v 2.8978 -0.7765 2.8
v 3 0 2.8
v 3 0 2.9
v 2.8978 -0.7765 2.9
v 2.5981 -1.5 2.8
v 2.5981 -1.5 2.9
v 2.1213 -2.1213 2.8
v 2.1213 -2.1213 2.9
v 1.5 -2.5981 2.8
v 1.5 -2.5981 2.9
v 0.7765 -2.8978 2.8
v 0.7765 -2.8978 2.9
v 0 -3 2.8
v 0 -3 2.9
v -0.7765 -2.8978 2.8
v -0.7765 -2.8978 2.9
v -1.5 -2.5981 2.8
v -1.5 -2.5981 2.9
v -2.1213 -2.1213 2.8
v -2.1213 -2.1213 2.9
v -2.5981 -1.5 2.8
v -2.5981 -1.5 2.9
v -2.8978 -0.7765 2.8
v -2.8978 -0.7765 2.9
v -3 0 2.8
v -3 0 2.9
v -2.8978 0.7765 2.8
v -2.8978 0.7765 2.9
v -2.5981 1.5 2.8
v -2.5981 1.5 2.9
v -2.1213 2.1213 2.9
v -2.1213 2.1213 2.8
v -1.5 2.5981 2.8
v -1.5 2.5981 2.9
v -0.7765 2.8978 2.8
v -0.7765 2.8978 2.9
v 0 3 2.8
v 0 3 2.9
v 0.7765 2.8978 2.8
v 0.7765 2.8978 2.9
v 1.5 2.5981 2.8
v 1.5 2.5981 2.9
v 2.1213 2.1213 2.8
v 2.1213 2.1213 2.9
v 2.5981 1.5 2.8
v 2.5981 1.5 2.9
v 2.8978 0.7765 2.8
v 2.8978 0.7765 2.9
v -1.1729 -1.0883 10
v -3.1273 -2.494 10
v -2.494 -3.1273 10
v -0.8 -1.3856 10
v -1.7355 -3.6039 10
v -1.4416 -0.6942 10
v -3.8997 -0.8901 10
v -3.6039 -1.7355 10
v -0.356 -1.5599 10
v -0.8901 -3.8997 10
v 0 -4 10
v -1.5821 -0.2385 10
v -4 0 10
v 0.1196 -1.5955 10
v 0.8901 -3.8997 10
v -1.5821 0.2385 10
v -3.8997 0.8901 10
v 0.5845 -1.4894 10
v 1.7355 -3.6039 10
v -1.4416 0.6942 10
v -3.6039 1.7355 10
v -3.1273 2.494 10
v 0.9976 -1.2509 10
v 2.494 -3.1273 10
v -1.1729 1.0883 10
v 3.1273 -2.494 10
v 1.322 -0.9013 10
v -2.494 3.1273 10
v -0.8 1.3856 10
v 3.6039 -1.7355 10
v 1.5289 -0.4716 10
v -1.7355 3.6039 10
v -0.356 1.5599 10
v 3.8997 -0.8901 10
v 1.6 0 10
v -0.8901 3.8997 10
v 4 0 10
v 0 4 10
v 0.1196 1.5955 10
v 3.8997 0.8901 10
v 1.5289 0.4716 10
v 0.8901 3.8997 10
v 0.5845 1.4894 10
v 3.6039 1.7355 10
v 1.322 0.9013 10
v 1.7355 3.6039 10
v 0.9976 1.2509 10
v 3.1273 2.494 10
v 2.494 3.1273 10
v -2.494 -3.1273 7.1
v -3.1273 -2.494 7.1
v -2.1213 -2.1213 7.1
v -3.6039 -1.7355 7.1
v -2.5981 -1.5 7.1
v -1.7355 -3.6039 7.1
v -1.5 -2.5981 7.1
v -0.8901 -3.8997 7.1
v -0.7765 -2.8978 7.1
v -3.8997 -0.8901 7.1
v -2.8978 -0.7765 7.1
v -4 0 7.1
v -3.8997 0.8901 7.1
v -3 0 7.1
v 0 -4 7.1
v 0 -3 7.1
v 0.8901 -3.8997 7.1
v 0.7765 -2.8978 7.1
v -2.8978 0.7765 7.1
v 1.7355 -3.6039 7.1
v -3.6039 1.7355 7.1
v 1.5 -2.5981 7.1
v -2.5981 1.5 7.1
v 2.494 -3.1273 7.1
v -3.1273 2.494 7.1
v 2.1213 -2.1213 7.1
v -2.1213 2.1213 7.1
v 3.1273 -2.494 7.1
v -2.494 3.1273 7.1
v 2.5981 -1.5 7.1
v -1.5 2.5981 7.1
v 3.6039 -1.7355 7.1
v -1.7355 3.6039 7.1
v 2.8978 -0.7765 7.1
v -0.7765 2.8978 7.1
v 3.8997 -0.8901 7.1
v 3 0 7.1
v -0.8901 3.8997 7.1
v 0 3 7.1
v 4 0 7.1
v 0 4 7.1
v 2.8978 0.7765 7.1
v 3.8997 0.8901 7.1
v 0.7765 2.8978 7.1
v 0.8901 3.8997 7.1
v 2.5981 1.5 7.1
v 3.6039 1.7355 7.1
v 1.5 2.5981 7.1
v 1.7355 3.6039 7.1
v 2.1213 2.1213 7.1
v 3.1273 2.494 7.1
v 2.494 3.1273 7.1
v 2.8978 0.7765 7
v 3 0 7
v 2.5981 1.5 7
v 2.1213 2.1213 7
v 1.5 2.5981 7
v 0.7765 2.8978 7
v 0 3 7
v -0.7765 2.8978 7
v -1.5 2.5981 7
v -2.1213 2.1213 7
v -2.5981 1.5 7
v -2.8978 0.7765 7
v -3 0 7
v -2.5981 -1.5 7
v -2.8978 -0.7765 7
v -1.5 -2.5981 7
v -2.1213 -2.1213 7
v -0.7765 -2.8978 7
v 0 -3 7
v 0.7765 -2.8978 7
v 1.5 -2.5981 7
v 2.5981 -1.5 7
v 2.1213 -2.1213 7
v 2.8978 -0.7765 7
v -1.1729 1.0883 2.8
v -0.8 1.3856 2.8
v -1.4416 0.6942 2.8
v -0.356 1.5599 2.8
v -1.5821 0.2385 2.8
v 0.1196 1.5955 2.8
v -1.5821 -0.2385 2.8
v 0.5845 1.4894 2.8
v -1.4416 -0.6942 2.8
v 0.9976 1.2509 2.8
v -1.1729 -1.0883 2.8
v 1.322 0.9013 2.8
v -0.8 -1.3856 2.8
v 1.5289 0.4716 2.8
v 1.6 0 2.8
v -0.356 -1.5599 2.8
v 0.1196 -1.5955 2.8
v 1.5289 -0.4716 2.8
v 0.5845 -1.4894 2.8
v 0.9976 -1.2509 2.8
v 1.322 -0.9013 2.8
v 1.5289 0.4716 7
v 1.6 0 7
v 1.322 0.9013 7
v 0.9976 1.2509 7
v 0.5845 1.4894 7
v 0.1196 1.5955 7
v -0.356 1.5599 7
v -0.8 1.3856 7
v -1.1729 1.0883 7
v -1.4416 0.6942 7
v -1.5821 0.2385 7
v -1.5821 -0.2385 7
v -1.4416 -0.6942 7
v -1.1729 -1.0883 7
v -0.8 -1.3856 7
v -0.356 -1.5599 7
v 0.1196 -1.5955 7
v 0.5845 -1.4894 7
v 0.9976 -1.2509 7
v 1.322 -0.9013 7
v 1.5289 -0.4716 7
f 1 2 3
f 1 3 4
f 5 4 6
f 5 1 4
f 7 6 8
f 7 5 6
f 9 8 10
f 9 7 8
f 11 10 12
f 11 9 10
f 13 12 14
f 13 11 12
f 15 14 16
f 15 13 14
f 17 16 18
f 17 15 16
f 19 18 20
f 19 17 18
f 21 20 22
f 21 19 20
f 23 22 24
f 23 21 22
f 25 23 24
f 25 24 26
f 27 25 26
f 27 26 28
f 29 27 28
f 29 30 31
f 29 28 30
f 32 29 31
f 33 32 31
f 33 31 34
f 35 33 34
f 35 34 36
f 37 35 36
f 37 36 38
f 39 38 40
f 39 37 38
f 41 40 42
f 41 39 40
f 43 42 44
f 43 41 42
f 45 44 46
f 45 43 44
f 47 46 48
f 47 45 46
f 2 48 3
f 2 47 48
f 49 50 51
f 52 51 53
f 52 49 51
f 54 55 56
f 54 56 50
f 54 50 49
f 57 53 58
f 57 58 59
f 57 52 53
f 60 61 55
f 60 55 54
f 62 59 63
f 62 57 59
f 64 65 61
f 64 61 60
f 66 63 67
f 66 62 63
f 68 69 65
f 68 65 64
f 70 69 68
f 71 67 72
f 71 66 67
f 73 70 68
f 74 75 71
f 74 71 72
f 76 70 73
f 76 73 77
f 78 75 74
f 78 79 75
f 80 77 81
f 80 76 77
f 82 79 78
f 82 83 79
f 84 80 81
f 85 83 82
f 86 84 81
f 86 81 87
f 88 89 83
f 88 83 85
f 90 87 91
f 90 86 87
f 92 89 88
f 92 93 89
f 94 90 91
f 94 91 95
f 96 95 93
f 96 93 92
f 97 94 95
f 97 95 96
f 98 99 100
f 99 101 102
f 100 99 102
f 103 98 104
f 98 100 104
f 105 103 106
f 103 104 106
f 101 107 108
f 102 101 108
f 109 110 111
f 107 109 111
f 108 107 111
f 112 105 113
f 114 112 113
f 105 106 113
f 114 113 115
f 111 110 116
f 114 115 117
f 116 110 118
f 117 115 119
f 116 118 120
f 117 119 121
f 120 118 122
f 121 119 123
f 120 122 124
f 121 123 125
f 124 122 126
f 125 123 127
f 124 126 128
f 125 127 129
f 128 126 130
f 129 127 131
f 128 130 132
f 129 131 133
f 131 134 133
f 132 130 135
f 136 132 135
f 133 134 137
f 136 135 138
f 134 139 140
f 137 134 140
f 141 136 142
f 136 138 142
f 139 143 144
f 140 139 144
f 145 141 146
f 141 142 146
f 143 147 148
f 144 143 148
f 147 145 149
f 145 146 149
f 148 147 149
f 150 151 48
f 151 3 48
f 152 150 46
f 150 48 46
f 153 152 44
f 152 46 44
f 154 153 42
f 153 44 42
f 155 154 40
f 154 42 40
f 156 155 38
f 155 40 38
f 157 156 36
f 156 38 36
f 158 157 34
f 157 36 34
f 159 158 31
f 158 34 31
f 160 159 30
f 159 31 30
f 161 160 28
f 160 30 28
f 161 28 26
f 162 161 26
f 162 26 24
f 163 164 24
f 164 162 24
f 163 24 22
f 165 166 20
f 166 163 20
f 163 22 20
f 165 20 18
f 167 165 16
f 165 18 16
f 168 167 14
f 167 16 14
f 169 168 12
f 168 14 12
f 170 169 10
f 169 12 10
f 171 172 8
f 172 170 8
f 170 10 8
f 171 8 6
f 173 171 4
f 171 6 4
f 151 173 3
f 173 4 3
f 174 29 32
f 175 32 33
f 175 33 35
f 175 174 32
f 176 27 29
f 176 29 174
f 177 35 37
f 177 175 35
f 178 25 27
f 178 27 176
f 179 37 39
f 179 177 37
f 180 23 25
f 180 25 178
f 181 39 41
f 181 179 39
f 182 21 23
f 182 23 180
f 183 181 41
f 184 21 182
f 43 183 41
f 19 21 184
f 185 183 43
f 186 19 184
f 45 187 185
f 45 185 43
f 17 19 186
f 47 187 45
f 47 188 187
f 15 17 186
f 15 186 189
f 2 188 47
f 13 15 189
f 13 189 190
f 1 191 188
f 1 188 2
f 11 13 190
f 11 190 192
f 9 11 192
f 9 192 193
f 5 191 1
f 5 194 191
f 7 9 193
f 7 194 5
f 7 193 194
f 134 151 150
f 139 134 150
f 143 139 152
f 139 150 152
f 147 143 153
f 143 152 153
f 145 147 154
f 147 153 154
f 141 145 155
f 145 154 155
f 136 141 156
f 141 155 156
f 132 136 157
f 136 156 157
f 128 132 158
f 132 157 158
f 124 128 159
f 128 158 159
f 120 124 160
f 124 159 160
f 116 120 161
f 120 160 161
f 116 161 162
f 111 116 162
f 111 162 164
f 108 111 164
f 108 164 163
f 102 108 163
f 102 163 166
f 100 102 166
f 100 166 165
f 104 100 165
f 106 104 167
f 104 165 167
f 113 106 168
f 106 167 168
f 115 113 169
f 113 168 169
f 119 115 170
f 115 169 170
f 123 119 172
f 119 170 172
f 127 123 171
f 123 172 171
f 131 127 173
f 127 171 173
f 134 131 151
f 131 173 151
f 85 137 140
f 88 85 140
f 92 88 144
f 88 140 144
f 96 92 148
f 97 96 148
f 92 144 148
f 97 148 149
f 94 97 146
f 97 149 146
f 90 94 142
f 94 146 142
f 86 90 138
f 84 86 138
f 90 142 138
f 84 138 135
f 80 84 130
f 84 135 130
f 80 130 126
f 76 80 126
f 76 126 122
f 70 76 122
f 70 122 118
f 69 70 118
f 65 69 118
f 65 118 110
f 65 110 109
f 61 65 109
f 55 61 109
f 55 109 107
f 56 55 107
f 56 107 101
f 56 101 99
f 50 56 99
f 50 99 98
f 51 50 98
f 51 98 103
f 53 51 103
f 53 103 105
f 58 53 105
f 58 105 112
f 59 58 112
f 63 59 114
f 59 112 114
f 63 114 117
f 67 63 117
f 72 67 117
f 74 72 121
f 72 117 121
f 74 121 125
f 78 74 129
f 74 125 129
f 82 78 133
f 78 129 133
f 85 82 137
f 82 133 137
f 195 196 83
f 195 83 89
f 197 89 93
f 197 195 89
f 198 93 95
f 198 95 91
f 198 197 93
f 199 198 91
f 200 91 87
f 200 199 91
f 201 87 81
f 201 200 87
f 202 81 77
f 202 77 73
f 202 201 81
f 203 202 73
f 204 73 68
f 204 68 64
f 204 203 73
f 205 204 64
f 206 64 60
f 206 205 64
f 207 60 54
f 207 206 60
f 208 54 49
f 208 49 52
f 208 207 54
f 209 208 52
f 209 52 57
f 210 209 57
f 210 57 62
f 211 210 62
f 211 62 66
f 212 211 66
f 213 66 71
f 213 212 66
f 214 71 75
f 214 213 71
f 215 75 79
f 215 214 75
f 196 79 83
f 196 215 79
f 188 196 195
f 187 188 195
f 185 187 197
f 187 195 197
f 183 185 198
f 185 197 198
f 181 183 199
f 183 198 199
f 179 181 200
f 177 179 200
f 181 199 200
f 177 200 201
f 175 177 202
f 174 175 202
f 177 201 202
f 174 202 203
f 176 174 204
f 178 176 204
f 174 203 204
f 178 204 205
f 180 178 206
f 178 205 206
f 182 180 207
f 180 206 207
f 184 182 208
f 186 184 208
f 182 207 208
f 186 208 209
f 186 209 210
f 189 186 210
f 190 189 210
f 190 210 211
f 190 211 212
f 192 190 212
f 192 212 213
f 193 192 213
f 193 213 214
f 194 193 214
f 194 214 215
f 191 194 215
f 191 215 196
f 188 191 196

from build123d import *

# Parameters (mm, degrees)
SKETCH_1_R          = 4
EXTRUDE_1_DEPTH     = 7
SKETCH_2_R          = 1.6
CUT_EXTRUDE_1_DEPTH = 10
SKETCH_3_OUTSIDE_W  = 12.66
SKETCH_3_OUTSIDE_H  = 12.66
SKETCH_3_OUTSIDE_R  = 3
CUT_EXTRUDE_2_DEPTH = 4
SKETCH_4_R          = 4
SKETCH_4_R_2        = 1.6
EXTRUDE_2_DEPTH     = 3
SKETCH_5_R          = 4
SKETCH_5_R_2        = 3
CUT_EXTRUDE_3_DEPTH = 2.1
SKETCH_6_OUTSIDE_W  = 13.02
SKETCH_6_OUTSIDE_H  = 13.02
SKETCH_6_OUTSIDE_R  = 3
CUT_EXTRUDE_4_DEPTH = 7
SKETCH_7_R          = 3
CUT_EXTRUDE_5_DEPTH = 2.8


with BuildPart() as part:
    # 草图1 → 凸台-拉伸1 (new body)
    with BuildSketch(Plane.XY):
        Circle(SKETCH_1_R)
    extrude(amount=EXTRUDE_1_DEPTH)

    # 草图2 → 切除-拉伸1 (cut, through all)
    with BuildSketch(Plane.XY.offset(7)):
        Circle(SKETCH_2_R)
    extrude(amount=-CUT_EXTRUDE_1_DEPTH, mode=Mode.SUBTRACT)

    # 草图3 outside → 切除-拉伸2 (cut)
    with BuildSketch(Plane.XY.offset(7)):
        Rectangle(SKETCH_3_OUTSIDE_W, SKETCH_3_OUTSIDE_H)
        Circle(SKETCH_3_OUTSIDE_R, mode=Mode.SUBTRACT)
    extrude(amount=-CUT_EXTRUDE_2_DEPTH, mode=Mode.SUBTRACT)

    # 草图4 → 凸台-拉伸2 (add)
    with BuildSketch(Plane.XY.offset(7)):
        Circle(SKETCH_4_R)
        Circle(SKETCH_4_R_2, mode=Mode.SUBTRACT)
    extrude(amount=EXTRUDE_2_DEPTH)

    # 草图5 → 切除-拉伸3 (cut, symmetric)
    with BuildSketch(Plane.XY.offset(5)):
        Circle(SKETCH_5_R)
        Circle(SKETCH_5_R_2, mode=Mode.SUBTRACT)
    extrude(amount=CUT_EXTRUDE_3_DEPTH, both=True, mode=Mode.SUBTRACT)

    # 草图6 outside → 切除-拉伸4 (cut)
    with BuildSketch(Plane(origin=(0, 0, 0), x_dir=(-1, 0, 0), z_dir=(0, 0, -1))):
        Rectangle(SKETCH_6_OUTSIDE_W, SKETCH_6_OUTSIDE_H)
        with Locations(Location((0, 0, 0), (0, 0, 180))):
            Circle(SKETCH_6_OUTSIDE_R, mode=Mode.SUBTRACT)
    extrude(amount=-CUT_EXTRUDE_4_DEPTH, mode=Mode.SUBTRACT)

    # 草图7 → 切除-拉伸5 (cut)
    with BuildSketch(Plane(origin=(0, 0, 0), x_dir=(-1, 0, 0), z_dir=(0, 0, -1))):
        with Locations(Location((0, 0, 0), (0, 0, 180))):
            Circle(SKETCH_7_R)
    extrude(amount=-CUT_EXTRUDE_5_DEPTH, mode=Mode.SUBTRACT)


solid = part.part
